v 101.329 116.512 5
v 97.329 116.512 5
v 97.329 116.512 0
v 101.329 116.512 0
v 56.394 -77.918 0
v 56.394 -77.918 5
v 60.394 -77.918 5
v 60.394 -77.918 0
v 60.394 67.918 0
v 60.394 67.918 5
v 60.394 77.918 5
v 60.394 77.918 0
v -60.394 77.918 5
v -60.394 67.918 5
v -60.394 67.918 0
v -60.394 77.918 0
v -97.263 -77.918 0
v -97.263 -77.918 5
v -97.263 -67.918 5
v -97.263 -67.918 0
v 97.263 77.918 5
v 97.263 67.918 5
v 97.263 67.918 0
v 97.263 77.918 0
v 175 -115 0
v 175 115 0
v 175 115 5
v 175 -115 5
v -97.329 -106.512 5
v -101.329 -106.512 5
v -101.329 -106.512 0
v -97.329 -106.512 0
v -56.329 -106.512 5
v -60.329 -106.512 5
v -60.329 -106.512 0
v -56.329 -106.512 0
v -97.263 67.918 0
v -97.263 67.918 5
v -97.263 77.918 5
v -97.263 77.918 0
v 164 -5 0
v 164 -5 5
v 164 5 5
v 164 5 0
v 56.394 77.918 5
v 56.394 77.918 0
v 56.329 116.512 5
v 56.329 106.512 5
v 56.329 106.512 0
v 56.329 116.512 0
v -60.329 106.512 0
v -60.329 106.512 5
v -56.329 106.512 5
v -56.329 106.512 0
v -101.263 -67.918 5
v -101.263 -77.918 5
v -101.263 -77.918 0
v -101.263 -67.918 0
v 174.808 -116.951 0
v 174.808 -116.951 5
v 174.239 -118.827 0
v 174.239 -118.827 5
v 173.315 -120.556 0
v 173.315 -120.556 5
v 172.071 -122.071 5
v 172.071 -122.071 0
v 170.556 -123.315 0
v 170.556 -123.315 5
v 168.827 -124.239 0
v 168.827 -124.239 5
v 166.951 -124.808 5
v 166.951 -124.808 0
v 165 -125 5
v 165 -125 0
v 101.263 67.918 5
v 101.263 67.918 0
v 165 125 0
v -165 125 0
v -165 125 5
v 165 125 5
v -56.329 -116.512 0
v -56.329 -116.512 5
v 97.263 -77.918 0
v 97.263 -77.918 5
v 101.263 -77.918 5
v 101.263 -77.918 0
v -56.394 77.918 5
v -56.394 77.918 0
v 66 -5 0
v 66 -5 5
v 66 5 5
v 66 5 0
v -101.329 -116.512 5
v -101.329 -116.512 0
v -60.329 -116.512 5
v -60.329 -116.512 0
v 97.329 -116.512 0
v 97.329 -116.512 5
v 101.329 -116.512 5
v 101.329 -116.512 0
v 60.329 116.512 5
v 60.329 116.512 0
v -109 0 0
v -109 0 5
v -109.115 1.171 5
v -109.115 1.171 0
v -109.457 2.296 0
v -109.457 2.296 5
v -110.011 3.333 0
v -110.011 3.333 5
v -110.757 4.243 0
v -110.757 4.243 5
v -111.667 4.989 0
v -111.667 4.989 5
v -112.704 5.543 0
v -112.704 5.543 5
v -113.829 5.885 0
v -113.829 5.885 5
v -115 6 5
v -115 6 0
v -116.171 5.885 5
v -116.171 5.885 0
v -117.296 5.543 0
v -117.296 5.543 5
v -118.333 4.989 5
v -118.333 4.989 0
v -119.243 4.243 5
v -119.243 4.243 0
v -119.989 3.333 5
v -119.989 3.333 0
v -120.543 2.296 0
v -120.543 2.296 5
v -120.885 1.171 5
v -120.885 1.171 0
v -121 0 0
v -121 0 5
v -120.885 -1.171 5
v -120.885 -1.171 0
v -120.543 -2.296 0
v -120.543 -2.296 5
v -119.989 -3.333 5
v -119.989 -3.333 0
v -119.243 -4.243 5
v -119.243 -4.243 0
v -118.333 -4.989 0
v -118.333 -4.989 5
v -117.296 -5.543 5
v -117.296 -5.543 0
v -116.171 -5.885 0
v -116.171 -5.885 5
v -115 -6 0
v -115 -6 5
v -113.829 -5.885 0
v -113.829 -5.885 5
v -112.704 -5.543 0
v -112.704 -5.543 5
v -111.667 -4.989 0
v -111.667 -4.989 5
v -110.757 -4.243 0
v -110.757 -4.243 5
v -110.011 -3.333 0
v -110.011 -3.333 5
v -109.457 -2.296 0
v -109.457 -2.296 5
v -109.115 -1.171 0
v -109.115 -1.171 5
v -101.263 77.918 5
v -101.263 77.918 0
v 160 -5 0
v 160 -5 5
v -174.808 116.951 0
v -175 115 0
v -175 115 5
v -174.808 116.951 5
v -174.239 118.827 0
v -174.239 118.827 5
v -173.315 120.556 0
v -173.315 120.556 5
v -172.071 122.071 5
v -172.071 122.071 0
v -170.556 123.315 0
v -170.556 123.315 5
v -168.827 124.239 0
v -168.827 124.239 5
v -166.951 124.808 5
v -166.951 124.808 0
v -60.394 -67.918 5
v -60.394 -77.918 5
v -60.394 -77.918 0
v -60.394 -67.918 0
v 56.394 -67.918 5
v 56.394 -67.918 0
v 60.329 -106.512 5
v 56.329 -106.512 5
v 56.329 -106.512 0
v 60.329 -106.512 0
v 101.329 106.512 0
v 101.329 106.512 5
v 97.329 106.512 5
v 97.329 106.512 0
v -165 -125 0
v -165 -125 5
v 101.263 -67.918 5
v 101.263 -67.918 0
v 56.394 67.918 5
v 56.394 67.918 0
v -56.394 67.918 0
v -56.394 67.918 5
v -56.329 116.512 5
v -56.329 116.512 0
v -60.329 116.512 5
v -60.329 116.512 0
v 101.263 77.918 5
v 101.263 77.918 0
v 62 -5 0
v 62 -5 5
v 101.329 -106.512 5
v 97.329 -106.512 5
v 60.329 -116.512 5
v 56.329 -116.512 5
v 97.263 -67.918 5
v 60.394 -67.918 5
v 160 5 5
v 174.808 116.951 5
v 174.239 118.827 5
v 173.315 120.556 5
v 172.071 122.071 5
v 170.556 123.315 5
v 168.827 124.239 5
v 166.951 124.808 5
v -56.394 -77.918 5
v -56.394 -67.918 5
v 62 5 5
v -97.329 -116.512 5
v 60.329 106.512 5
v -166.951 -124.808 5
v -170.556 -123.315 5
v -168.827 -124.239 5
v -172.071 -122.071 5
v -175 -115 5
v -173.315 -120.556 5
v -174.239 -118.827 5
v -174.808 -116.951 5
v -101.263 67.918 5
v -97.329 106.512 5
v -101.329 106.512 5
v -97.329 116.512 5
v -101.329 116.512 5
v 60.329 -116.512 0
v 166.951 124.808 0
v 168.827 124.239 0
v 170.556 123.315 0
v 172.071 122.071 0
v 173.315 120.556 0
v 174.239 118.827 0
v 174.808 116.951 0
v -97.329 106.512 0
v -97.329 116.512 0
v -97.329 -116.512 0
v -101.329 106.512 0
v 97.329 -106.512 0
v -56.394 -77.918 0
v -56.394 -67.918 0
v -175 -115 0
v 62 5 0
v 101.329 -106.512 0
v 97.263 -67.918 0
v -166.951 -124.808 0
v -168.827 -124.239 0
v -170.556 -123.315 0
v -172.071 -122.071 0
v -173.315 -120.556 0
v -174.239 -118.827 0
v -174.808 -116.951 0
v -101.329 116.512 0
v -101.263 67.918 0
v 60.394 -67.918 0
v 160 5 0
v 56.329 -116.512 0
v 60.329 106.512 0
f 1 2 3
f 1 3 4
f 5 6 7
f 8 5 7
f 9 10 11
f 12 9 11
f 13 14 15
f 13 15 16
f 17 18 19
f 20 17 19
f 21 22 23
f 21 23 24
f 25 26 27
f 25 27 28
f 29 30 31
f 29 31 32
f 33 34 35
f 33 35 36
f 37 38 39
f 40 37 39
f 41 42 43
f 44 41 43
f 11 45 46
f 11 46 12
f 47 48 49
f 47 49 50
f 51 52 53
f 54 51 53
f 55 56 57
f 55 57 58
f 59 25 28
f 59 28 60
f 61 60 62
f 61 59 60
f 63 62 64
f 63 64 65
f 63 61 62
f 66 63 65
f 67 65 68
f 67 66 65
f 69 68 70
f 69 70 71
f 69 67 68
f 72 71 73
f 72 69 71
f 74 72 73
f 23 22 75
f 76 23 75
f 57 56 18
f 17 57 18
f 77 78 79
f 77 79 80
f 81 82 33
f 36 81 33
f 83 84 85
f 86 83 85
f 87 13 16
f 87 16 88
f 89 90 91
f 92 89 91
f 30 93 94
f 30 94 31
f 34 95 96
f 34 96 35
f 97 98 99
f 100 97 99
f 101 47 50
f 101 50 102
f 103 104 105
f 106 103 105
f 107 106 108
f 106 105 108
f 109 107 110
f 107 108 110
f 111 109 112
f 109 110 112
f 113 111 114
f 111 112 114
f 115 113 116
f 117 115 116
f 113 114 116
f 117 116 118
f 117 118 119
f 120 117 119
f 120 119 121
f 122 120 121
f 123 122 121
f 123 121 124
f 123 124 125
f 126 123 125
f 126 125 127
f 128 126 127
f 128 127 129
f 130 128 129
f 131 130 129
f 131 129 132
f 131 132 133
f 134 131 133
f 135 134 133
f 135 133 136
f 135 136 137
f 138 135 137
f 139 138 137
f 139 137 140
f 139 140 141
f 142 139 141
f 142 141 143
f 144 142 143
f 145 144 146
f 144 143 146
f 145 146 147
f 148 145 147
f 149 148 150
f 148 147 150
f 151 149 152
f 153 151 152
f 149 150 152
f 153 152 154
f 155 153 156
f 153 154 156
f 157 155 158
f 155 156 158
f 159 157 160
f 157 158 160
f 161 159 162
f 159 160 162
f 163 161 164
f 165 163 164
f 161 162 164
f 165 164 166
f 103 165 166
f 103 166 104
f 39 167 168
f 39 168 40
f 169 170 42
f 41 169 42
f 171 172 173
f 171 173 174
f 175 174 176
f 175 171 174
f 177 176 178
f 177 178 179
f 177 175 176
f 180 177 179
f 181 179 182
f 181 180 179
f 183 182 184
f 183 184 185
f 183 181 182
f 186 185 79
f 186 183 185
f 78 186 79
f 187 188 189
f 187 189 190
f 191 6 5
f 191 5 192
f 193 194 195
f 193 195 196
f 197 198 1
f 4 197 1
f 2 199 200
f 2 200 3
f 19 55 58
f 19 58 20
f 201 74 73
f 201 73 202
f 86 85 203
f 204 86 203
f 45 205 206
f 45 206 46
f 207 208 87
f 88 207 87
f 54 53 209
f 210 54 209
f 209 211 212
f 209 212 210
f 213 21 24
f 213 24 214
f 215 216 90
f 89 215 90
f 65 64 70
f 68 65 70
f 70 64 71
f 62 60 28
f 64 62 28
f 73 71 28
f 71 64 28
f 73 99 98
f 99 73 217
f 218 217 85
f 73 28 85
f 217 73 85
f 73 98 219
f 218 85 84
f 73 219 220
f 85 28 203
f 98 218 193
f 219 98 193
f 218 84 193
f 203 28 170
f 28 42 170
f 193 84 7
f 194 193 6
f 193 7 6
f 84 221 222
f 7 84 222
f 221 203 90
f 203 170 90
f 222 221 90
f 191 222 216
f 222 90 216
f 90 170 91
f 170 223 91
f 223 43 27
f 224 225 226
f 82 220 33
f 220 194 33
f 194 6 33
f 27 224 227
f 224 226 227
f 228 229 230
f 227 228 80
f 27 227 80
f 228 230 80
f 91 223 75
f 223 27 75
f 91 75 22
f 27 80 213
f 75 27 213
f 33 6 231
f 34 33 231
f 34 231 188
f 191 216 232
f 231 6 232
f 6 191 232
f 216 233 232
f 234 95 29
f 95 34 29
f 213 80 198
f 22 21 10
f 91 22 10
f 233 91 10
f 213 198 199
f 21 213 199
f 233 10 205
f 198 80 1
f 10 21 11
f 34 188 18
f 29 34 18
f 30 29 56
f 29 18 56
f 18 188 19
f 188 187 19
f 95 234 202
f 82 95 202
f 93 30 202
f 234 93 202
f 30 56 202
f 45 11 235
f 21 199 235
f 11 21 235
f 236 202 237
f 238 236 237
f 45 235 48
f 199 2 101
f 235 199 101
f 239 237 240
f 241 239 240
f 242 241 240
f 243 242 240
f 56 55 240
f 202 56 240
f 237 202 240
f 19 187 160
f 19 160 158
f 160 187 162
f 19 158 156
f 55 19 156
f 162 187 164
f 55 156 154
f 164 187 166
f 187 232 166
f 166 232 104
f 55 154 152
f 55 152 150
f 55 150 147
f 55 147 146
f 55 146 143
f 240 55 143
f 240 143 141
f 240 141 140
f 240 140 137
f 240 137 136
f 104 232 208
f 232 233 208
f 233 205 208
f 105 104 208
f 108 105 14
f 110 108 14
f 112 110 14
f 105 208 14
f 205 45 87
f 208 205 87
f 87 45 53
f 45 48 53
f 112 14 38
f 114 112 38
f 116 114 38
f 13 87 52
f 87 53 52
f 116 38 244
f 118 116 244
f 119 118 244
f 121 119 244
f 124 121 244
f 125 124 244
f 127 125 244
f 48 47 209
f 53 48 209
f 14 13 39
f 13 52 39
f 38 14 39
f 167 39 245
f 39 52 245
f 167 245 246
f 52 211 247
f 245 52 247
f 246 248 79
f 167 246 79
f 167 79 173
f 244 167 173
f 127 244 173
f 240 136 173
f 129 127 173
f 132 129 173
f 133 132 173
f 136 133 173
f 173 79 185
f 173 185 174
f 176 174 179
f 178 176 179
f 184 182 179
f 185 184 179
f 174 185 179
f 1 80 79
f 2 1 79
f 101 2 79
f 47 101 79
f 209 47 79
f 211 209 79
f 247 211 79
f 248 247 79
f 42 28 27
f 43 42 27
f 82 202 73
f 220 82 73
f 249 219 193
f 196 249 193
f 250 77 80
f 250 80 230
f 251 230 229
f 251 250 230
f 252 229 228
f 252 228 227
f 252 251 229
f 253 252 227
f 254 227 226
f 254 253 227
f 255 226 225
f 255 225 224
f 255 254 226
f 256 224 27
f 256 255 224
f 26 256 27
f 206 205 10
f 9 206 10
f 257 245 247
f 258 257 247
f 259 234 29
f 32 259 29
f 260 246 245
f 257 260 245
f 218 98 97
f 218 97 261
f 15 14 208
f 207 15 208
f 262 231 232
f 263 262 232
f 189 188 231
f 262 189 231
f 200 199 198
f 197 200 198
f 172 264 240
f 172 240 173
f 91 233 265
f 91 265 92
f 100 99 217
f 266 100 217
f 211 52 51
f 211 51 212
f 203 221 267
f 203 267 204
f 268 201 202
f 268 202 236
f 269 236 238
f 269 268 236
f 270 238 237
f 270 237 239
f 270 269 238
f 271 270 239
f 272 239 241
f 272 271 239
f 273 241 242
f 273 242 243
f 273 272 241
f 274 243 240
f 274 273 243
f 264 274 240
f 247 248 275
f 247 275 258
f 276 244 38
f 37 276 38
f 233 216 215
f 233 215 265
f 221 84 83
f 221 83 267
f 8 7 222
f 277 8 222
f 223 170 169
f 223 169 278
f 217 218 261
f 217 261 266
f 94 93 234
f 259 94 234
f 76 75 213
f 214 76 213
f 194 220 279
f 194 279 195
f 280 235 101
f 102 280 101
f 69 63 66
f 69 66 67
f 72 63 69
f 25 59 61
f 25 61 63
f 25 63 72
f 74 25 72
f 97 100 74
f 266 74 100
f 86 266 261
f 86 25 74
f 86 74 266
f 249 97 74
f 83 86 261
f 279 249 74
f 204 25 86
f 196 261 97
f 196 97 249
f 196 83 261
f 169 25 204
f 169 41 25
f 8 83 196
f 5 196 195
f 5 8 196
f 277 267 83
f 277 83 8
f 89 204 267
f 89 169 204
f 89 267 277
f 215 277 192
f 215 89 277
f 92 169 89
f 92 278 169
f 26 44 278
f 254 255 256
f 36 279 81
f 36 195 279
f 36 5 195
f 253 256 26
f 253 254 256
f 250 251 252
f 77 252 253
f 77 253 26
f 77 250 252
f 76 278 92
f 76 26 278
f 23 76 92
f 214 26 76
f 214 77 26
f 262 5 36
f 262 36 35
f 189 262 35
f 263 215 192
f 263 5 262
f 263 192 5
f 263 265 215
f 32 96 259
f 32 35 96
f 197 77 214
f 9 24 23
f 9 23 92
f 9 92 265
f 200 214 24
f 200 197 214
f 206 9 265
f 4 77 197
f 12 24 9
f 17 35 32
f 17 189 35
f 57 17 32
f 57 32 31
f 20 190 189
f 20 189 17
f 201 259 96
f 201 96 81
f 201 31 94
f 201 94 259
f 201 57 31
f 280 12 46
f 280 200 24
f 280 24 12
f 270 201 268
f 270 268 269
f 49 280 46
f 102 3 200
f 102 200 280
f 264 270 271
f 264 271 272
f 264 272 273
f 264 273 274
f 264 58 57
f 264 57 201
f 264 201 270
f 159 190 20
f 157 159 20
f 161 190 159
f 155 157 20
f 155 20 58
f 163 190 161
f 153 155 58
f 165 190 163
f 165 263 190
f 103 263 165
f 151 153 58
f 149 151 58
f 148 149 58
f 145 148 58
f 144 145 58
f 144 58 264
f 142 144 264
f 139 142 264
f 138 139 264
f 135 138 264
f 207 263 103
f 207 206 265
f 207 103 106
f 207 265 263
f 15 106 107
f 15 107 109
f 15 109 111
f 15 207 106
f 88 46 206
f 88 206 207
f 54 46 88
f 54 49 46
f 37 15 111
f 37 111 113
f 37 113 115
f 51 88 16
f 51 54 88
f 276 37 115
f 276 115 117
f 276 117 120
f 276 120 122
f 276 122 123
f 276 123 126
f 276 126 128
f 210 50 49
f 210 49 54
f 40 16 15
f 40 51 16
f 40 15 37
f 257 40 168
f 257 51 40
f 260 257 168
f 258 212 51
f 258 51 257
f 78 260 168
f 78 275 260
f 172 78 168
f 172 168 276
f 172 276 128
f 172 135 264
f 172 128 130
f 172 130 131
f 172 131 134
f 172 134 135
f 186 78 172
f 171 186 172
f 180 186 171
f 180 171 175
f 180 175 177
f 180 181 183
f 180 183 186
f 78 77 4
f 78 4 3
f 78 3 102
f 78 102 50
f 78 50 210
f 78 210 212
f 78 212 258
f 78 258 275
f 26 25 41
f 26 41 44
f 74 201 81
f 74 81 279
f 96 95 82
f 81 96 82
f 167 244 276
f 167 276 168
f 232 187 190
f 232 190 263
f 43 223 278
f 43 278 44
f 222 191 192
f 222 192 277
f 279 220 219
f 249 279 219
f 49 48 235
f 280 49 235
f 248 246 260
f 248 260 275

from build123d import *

# Parameters (mm, degrees)
BOSS_EXTRUDE1_DEPTH = 5
SKETCH2_W           = 4
SKETCH2_H           = 10
CUT_EXTRUDE1_DEPTH  = 10
SKETCH3_R           = 6
SKETCH3_W           = 4
SKETCH3_H           = 10
CUT_EXTRUDE2_DEPTH  = 10


with BuildPart() as part:
    # Sketch1 → Boss-Extrude1 (new body)
    with BuildSketch(Plane.XY):
        with BuildLine():
            Line((-165, 125), (165, 125))
            ThreePointArc((165, 125), (172.071067812, 122.071067812), (175, 115))
            Line((175, 115), (175, -115))
            ThreePointArc((175, -115), (172.071067812, -122.071067812), (165, -125))
            Line((165, -125), (-165, -125))
            ThreePointArc((-165, -125), (-172.071067812, -122.071067812), (-175, -115))
            Line((-175, -115), (-175, 115))
            ThreePointArc((-175, 115), (-172.071067812, 122.071067812), (-165, 125))
        make_face()
    extrude(amount=BOSS_EXTRUDE1_DEPTH)

    # Sketch2 → Cut-Extrude1 (cut)
    with BuildSketch(Plane.XY.offset(5)):
        with Locations((99.328502067, 111.512009489)):
            Rectangle(SKETCH2_W, SKETCH2_H)
        with Locations((99.262510454, 72.917517572)):
            Rectangle(SKETCH2_W, SKETCH2_H)
        with Locations((58.394493679, 72.917517572)):
            Rectangle(SKETCH2_W, SKETCH2_H)
        with Locations((58.328502067, 111.512009489)):
            Rectangle(SKETCH2_W, SKETCH2_H)
        with Locations((58.328502067, -111.512009489)):
            Rectangle(SKETCH2_W, SKETCH2_H)
        with Locations((58.394493679, -72.917517572)):
            Rectangle(SKETCH2_W, SKETCH2_H)
        with Locations((99.262510454, -72.917517572)):
            Rectangle(SKETCH2_W, SKETCH2_H)
        with Locations((99.328502067, -111.512009489)):
            Rectangle(SKETCH2_W, SKETCH2_H)
        with Locations((-99.328502067, -111.512009489)):
            Rectangle(SKETCH2_W, SKETCH2_H)
        with Locations((-99.262510454, -72.917517572)):
            Rectangle(SKETCH2_W, SKETCH2_H)
        with Locations((-58.394493679, -72.917517572)):
            Rectangle(SKETCH2_W, SKETCH2_H)
        with Locations((-58.328502067, -111.512009489)):
            Rectangle(SKETCH2_W, SKETCH2_H)
        with Locations((-58.328502067, 111.512009489)):
            Rectangle(SKETCH2_W, SKETCH2_H)
        with Locations((-58.394493679, 72.917517572)):
            Rectangle(SKETCH2_W, SKETCH2_H)
        with Locations((-99.262510454, 72.917517572)):
            Rectangle(SKETCH2_W, SKETCH2_H)
        with Locations((-99.328502067, 111.512009489)):
            Rectangle(SKETCH2_W, SKETCH2_H)
    extrude(amount=-CUT_EXTRUDE1_DEPTH, mode=Mode.SUBTRACT)

    # Sketch3 → Cut-Extrude2 (cut)
    with BuildSketch(Plane.XY.offset(5)):
        with Locations((-115, 0)):
            Circle(SKETCH3_R)
        with Locations((162, 0)):
            Rectangle(SKETCH3_W, SKETCH3_H)
        with Locations((64, 0)):
            Rectangle(SKETCH3_W, SKETCH3_H)
    extrude(amount=-CUT_EXTRUDE2_DEPTH, mode=Mode.SUBTRACT)


solid = part.part
